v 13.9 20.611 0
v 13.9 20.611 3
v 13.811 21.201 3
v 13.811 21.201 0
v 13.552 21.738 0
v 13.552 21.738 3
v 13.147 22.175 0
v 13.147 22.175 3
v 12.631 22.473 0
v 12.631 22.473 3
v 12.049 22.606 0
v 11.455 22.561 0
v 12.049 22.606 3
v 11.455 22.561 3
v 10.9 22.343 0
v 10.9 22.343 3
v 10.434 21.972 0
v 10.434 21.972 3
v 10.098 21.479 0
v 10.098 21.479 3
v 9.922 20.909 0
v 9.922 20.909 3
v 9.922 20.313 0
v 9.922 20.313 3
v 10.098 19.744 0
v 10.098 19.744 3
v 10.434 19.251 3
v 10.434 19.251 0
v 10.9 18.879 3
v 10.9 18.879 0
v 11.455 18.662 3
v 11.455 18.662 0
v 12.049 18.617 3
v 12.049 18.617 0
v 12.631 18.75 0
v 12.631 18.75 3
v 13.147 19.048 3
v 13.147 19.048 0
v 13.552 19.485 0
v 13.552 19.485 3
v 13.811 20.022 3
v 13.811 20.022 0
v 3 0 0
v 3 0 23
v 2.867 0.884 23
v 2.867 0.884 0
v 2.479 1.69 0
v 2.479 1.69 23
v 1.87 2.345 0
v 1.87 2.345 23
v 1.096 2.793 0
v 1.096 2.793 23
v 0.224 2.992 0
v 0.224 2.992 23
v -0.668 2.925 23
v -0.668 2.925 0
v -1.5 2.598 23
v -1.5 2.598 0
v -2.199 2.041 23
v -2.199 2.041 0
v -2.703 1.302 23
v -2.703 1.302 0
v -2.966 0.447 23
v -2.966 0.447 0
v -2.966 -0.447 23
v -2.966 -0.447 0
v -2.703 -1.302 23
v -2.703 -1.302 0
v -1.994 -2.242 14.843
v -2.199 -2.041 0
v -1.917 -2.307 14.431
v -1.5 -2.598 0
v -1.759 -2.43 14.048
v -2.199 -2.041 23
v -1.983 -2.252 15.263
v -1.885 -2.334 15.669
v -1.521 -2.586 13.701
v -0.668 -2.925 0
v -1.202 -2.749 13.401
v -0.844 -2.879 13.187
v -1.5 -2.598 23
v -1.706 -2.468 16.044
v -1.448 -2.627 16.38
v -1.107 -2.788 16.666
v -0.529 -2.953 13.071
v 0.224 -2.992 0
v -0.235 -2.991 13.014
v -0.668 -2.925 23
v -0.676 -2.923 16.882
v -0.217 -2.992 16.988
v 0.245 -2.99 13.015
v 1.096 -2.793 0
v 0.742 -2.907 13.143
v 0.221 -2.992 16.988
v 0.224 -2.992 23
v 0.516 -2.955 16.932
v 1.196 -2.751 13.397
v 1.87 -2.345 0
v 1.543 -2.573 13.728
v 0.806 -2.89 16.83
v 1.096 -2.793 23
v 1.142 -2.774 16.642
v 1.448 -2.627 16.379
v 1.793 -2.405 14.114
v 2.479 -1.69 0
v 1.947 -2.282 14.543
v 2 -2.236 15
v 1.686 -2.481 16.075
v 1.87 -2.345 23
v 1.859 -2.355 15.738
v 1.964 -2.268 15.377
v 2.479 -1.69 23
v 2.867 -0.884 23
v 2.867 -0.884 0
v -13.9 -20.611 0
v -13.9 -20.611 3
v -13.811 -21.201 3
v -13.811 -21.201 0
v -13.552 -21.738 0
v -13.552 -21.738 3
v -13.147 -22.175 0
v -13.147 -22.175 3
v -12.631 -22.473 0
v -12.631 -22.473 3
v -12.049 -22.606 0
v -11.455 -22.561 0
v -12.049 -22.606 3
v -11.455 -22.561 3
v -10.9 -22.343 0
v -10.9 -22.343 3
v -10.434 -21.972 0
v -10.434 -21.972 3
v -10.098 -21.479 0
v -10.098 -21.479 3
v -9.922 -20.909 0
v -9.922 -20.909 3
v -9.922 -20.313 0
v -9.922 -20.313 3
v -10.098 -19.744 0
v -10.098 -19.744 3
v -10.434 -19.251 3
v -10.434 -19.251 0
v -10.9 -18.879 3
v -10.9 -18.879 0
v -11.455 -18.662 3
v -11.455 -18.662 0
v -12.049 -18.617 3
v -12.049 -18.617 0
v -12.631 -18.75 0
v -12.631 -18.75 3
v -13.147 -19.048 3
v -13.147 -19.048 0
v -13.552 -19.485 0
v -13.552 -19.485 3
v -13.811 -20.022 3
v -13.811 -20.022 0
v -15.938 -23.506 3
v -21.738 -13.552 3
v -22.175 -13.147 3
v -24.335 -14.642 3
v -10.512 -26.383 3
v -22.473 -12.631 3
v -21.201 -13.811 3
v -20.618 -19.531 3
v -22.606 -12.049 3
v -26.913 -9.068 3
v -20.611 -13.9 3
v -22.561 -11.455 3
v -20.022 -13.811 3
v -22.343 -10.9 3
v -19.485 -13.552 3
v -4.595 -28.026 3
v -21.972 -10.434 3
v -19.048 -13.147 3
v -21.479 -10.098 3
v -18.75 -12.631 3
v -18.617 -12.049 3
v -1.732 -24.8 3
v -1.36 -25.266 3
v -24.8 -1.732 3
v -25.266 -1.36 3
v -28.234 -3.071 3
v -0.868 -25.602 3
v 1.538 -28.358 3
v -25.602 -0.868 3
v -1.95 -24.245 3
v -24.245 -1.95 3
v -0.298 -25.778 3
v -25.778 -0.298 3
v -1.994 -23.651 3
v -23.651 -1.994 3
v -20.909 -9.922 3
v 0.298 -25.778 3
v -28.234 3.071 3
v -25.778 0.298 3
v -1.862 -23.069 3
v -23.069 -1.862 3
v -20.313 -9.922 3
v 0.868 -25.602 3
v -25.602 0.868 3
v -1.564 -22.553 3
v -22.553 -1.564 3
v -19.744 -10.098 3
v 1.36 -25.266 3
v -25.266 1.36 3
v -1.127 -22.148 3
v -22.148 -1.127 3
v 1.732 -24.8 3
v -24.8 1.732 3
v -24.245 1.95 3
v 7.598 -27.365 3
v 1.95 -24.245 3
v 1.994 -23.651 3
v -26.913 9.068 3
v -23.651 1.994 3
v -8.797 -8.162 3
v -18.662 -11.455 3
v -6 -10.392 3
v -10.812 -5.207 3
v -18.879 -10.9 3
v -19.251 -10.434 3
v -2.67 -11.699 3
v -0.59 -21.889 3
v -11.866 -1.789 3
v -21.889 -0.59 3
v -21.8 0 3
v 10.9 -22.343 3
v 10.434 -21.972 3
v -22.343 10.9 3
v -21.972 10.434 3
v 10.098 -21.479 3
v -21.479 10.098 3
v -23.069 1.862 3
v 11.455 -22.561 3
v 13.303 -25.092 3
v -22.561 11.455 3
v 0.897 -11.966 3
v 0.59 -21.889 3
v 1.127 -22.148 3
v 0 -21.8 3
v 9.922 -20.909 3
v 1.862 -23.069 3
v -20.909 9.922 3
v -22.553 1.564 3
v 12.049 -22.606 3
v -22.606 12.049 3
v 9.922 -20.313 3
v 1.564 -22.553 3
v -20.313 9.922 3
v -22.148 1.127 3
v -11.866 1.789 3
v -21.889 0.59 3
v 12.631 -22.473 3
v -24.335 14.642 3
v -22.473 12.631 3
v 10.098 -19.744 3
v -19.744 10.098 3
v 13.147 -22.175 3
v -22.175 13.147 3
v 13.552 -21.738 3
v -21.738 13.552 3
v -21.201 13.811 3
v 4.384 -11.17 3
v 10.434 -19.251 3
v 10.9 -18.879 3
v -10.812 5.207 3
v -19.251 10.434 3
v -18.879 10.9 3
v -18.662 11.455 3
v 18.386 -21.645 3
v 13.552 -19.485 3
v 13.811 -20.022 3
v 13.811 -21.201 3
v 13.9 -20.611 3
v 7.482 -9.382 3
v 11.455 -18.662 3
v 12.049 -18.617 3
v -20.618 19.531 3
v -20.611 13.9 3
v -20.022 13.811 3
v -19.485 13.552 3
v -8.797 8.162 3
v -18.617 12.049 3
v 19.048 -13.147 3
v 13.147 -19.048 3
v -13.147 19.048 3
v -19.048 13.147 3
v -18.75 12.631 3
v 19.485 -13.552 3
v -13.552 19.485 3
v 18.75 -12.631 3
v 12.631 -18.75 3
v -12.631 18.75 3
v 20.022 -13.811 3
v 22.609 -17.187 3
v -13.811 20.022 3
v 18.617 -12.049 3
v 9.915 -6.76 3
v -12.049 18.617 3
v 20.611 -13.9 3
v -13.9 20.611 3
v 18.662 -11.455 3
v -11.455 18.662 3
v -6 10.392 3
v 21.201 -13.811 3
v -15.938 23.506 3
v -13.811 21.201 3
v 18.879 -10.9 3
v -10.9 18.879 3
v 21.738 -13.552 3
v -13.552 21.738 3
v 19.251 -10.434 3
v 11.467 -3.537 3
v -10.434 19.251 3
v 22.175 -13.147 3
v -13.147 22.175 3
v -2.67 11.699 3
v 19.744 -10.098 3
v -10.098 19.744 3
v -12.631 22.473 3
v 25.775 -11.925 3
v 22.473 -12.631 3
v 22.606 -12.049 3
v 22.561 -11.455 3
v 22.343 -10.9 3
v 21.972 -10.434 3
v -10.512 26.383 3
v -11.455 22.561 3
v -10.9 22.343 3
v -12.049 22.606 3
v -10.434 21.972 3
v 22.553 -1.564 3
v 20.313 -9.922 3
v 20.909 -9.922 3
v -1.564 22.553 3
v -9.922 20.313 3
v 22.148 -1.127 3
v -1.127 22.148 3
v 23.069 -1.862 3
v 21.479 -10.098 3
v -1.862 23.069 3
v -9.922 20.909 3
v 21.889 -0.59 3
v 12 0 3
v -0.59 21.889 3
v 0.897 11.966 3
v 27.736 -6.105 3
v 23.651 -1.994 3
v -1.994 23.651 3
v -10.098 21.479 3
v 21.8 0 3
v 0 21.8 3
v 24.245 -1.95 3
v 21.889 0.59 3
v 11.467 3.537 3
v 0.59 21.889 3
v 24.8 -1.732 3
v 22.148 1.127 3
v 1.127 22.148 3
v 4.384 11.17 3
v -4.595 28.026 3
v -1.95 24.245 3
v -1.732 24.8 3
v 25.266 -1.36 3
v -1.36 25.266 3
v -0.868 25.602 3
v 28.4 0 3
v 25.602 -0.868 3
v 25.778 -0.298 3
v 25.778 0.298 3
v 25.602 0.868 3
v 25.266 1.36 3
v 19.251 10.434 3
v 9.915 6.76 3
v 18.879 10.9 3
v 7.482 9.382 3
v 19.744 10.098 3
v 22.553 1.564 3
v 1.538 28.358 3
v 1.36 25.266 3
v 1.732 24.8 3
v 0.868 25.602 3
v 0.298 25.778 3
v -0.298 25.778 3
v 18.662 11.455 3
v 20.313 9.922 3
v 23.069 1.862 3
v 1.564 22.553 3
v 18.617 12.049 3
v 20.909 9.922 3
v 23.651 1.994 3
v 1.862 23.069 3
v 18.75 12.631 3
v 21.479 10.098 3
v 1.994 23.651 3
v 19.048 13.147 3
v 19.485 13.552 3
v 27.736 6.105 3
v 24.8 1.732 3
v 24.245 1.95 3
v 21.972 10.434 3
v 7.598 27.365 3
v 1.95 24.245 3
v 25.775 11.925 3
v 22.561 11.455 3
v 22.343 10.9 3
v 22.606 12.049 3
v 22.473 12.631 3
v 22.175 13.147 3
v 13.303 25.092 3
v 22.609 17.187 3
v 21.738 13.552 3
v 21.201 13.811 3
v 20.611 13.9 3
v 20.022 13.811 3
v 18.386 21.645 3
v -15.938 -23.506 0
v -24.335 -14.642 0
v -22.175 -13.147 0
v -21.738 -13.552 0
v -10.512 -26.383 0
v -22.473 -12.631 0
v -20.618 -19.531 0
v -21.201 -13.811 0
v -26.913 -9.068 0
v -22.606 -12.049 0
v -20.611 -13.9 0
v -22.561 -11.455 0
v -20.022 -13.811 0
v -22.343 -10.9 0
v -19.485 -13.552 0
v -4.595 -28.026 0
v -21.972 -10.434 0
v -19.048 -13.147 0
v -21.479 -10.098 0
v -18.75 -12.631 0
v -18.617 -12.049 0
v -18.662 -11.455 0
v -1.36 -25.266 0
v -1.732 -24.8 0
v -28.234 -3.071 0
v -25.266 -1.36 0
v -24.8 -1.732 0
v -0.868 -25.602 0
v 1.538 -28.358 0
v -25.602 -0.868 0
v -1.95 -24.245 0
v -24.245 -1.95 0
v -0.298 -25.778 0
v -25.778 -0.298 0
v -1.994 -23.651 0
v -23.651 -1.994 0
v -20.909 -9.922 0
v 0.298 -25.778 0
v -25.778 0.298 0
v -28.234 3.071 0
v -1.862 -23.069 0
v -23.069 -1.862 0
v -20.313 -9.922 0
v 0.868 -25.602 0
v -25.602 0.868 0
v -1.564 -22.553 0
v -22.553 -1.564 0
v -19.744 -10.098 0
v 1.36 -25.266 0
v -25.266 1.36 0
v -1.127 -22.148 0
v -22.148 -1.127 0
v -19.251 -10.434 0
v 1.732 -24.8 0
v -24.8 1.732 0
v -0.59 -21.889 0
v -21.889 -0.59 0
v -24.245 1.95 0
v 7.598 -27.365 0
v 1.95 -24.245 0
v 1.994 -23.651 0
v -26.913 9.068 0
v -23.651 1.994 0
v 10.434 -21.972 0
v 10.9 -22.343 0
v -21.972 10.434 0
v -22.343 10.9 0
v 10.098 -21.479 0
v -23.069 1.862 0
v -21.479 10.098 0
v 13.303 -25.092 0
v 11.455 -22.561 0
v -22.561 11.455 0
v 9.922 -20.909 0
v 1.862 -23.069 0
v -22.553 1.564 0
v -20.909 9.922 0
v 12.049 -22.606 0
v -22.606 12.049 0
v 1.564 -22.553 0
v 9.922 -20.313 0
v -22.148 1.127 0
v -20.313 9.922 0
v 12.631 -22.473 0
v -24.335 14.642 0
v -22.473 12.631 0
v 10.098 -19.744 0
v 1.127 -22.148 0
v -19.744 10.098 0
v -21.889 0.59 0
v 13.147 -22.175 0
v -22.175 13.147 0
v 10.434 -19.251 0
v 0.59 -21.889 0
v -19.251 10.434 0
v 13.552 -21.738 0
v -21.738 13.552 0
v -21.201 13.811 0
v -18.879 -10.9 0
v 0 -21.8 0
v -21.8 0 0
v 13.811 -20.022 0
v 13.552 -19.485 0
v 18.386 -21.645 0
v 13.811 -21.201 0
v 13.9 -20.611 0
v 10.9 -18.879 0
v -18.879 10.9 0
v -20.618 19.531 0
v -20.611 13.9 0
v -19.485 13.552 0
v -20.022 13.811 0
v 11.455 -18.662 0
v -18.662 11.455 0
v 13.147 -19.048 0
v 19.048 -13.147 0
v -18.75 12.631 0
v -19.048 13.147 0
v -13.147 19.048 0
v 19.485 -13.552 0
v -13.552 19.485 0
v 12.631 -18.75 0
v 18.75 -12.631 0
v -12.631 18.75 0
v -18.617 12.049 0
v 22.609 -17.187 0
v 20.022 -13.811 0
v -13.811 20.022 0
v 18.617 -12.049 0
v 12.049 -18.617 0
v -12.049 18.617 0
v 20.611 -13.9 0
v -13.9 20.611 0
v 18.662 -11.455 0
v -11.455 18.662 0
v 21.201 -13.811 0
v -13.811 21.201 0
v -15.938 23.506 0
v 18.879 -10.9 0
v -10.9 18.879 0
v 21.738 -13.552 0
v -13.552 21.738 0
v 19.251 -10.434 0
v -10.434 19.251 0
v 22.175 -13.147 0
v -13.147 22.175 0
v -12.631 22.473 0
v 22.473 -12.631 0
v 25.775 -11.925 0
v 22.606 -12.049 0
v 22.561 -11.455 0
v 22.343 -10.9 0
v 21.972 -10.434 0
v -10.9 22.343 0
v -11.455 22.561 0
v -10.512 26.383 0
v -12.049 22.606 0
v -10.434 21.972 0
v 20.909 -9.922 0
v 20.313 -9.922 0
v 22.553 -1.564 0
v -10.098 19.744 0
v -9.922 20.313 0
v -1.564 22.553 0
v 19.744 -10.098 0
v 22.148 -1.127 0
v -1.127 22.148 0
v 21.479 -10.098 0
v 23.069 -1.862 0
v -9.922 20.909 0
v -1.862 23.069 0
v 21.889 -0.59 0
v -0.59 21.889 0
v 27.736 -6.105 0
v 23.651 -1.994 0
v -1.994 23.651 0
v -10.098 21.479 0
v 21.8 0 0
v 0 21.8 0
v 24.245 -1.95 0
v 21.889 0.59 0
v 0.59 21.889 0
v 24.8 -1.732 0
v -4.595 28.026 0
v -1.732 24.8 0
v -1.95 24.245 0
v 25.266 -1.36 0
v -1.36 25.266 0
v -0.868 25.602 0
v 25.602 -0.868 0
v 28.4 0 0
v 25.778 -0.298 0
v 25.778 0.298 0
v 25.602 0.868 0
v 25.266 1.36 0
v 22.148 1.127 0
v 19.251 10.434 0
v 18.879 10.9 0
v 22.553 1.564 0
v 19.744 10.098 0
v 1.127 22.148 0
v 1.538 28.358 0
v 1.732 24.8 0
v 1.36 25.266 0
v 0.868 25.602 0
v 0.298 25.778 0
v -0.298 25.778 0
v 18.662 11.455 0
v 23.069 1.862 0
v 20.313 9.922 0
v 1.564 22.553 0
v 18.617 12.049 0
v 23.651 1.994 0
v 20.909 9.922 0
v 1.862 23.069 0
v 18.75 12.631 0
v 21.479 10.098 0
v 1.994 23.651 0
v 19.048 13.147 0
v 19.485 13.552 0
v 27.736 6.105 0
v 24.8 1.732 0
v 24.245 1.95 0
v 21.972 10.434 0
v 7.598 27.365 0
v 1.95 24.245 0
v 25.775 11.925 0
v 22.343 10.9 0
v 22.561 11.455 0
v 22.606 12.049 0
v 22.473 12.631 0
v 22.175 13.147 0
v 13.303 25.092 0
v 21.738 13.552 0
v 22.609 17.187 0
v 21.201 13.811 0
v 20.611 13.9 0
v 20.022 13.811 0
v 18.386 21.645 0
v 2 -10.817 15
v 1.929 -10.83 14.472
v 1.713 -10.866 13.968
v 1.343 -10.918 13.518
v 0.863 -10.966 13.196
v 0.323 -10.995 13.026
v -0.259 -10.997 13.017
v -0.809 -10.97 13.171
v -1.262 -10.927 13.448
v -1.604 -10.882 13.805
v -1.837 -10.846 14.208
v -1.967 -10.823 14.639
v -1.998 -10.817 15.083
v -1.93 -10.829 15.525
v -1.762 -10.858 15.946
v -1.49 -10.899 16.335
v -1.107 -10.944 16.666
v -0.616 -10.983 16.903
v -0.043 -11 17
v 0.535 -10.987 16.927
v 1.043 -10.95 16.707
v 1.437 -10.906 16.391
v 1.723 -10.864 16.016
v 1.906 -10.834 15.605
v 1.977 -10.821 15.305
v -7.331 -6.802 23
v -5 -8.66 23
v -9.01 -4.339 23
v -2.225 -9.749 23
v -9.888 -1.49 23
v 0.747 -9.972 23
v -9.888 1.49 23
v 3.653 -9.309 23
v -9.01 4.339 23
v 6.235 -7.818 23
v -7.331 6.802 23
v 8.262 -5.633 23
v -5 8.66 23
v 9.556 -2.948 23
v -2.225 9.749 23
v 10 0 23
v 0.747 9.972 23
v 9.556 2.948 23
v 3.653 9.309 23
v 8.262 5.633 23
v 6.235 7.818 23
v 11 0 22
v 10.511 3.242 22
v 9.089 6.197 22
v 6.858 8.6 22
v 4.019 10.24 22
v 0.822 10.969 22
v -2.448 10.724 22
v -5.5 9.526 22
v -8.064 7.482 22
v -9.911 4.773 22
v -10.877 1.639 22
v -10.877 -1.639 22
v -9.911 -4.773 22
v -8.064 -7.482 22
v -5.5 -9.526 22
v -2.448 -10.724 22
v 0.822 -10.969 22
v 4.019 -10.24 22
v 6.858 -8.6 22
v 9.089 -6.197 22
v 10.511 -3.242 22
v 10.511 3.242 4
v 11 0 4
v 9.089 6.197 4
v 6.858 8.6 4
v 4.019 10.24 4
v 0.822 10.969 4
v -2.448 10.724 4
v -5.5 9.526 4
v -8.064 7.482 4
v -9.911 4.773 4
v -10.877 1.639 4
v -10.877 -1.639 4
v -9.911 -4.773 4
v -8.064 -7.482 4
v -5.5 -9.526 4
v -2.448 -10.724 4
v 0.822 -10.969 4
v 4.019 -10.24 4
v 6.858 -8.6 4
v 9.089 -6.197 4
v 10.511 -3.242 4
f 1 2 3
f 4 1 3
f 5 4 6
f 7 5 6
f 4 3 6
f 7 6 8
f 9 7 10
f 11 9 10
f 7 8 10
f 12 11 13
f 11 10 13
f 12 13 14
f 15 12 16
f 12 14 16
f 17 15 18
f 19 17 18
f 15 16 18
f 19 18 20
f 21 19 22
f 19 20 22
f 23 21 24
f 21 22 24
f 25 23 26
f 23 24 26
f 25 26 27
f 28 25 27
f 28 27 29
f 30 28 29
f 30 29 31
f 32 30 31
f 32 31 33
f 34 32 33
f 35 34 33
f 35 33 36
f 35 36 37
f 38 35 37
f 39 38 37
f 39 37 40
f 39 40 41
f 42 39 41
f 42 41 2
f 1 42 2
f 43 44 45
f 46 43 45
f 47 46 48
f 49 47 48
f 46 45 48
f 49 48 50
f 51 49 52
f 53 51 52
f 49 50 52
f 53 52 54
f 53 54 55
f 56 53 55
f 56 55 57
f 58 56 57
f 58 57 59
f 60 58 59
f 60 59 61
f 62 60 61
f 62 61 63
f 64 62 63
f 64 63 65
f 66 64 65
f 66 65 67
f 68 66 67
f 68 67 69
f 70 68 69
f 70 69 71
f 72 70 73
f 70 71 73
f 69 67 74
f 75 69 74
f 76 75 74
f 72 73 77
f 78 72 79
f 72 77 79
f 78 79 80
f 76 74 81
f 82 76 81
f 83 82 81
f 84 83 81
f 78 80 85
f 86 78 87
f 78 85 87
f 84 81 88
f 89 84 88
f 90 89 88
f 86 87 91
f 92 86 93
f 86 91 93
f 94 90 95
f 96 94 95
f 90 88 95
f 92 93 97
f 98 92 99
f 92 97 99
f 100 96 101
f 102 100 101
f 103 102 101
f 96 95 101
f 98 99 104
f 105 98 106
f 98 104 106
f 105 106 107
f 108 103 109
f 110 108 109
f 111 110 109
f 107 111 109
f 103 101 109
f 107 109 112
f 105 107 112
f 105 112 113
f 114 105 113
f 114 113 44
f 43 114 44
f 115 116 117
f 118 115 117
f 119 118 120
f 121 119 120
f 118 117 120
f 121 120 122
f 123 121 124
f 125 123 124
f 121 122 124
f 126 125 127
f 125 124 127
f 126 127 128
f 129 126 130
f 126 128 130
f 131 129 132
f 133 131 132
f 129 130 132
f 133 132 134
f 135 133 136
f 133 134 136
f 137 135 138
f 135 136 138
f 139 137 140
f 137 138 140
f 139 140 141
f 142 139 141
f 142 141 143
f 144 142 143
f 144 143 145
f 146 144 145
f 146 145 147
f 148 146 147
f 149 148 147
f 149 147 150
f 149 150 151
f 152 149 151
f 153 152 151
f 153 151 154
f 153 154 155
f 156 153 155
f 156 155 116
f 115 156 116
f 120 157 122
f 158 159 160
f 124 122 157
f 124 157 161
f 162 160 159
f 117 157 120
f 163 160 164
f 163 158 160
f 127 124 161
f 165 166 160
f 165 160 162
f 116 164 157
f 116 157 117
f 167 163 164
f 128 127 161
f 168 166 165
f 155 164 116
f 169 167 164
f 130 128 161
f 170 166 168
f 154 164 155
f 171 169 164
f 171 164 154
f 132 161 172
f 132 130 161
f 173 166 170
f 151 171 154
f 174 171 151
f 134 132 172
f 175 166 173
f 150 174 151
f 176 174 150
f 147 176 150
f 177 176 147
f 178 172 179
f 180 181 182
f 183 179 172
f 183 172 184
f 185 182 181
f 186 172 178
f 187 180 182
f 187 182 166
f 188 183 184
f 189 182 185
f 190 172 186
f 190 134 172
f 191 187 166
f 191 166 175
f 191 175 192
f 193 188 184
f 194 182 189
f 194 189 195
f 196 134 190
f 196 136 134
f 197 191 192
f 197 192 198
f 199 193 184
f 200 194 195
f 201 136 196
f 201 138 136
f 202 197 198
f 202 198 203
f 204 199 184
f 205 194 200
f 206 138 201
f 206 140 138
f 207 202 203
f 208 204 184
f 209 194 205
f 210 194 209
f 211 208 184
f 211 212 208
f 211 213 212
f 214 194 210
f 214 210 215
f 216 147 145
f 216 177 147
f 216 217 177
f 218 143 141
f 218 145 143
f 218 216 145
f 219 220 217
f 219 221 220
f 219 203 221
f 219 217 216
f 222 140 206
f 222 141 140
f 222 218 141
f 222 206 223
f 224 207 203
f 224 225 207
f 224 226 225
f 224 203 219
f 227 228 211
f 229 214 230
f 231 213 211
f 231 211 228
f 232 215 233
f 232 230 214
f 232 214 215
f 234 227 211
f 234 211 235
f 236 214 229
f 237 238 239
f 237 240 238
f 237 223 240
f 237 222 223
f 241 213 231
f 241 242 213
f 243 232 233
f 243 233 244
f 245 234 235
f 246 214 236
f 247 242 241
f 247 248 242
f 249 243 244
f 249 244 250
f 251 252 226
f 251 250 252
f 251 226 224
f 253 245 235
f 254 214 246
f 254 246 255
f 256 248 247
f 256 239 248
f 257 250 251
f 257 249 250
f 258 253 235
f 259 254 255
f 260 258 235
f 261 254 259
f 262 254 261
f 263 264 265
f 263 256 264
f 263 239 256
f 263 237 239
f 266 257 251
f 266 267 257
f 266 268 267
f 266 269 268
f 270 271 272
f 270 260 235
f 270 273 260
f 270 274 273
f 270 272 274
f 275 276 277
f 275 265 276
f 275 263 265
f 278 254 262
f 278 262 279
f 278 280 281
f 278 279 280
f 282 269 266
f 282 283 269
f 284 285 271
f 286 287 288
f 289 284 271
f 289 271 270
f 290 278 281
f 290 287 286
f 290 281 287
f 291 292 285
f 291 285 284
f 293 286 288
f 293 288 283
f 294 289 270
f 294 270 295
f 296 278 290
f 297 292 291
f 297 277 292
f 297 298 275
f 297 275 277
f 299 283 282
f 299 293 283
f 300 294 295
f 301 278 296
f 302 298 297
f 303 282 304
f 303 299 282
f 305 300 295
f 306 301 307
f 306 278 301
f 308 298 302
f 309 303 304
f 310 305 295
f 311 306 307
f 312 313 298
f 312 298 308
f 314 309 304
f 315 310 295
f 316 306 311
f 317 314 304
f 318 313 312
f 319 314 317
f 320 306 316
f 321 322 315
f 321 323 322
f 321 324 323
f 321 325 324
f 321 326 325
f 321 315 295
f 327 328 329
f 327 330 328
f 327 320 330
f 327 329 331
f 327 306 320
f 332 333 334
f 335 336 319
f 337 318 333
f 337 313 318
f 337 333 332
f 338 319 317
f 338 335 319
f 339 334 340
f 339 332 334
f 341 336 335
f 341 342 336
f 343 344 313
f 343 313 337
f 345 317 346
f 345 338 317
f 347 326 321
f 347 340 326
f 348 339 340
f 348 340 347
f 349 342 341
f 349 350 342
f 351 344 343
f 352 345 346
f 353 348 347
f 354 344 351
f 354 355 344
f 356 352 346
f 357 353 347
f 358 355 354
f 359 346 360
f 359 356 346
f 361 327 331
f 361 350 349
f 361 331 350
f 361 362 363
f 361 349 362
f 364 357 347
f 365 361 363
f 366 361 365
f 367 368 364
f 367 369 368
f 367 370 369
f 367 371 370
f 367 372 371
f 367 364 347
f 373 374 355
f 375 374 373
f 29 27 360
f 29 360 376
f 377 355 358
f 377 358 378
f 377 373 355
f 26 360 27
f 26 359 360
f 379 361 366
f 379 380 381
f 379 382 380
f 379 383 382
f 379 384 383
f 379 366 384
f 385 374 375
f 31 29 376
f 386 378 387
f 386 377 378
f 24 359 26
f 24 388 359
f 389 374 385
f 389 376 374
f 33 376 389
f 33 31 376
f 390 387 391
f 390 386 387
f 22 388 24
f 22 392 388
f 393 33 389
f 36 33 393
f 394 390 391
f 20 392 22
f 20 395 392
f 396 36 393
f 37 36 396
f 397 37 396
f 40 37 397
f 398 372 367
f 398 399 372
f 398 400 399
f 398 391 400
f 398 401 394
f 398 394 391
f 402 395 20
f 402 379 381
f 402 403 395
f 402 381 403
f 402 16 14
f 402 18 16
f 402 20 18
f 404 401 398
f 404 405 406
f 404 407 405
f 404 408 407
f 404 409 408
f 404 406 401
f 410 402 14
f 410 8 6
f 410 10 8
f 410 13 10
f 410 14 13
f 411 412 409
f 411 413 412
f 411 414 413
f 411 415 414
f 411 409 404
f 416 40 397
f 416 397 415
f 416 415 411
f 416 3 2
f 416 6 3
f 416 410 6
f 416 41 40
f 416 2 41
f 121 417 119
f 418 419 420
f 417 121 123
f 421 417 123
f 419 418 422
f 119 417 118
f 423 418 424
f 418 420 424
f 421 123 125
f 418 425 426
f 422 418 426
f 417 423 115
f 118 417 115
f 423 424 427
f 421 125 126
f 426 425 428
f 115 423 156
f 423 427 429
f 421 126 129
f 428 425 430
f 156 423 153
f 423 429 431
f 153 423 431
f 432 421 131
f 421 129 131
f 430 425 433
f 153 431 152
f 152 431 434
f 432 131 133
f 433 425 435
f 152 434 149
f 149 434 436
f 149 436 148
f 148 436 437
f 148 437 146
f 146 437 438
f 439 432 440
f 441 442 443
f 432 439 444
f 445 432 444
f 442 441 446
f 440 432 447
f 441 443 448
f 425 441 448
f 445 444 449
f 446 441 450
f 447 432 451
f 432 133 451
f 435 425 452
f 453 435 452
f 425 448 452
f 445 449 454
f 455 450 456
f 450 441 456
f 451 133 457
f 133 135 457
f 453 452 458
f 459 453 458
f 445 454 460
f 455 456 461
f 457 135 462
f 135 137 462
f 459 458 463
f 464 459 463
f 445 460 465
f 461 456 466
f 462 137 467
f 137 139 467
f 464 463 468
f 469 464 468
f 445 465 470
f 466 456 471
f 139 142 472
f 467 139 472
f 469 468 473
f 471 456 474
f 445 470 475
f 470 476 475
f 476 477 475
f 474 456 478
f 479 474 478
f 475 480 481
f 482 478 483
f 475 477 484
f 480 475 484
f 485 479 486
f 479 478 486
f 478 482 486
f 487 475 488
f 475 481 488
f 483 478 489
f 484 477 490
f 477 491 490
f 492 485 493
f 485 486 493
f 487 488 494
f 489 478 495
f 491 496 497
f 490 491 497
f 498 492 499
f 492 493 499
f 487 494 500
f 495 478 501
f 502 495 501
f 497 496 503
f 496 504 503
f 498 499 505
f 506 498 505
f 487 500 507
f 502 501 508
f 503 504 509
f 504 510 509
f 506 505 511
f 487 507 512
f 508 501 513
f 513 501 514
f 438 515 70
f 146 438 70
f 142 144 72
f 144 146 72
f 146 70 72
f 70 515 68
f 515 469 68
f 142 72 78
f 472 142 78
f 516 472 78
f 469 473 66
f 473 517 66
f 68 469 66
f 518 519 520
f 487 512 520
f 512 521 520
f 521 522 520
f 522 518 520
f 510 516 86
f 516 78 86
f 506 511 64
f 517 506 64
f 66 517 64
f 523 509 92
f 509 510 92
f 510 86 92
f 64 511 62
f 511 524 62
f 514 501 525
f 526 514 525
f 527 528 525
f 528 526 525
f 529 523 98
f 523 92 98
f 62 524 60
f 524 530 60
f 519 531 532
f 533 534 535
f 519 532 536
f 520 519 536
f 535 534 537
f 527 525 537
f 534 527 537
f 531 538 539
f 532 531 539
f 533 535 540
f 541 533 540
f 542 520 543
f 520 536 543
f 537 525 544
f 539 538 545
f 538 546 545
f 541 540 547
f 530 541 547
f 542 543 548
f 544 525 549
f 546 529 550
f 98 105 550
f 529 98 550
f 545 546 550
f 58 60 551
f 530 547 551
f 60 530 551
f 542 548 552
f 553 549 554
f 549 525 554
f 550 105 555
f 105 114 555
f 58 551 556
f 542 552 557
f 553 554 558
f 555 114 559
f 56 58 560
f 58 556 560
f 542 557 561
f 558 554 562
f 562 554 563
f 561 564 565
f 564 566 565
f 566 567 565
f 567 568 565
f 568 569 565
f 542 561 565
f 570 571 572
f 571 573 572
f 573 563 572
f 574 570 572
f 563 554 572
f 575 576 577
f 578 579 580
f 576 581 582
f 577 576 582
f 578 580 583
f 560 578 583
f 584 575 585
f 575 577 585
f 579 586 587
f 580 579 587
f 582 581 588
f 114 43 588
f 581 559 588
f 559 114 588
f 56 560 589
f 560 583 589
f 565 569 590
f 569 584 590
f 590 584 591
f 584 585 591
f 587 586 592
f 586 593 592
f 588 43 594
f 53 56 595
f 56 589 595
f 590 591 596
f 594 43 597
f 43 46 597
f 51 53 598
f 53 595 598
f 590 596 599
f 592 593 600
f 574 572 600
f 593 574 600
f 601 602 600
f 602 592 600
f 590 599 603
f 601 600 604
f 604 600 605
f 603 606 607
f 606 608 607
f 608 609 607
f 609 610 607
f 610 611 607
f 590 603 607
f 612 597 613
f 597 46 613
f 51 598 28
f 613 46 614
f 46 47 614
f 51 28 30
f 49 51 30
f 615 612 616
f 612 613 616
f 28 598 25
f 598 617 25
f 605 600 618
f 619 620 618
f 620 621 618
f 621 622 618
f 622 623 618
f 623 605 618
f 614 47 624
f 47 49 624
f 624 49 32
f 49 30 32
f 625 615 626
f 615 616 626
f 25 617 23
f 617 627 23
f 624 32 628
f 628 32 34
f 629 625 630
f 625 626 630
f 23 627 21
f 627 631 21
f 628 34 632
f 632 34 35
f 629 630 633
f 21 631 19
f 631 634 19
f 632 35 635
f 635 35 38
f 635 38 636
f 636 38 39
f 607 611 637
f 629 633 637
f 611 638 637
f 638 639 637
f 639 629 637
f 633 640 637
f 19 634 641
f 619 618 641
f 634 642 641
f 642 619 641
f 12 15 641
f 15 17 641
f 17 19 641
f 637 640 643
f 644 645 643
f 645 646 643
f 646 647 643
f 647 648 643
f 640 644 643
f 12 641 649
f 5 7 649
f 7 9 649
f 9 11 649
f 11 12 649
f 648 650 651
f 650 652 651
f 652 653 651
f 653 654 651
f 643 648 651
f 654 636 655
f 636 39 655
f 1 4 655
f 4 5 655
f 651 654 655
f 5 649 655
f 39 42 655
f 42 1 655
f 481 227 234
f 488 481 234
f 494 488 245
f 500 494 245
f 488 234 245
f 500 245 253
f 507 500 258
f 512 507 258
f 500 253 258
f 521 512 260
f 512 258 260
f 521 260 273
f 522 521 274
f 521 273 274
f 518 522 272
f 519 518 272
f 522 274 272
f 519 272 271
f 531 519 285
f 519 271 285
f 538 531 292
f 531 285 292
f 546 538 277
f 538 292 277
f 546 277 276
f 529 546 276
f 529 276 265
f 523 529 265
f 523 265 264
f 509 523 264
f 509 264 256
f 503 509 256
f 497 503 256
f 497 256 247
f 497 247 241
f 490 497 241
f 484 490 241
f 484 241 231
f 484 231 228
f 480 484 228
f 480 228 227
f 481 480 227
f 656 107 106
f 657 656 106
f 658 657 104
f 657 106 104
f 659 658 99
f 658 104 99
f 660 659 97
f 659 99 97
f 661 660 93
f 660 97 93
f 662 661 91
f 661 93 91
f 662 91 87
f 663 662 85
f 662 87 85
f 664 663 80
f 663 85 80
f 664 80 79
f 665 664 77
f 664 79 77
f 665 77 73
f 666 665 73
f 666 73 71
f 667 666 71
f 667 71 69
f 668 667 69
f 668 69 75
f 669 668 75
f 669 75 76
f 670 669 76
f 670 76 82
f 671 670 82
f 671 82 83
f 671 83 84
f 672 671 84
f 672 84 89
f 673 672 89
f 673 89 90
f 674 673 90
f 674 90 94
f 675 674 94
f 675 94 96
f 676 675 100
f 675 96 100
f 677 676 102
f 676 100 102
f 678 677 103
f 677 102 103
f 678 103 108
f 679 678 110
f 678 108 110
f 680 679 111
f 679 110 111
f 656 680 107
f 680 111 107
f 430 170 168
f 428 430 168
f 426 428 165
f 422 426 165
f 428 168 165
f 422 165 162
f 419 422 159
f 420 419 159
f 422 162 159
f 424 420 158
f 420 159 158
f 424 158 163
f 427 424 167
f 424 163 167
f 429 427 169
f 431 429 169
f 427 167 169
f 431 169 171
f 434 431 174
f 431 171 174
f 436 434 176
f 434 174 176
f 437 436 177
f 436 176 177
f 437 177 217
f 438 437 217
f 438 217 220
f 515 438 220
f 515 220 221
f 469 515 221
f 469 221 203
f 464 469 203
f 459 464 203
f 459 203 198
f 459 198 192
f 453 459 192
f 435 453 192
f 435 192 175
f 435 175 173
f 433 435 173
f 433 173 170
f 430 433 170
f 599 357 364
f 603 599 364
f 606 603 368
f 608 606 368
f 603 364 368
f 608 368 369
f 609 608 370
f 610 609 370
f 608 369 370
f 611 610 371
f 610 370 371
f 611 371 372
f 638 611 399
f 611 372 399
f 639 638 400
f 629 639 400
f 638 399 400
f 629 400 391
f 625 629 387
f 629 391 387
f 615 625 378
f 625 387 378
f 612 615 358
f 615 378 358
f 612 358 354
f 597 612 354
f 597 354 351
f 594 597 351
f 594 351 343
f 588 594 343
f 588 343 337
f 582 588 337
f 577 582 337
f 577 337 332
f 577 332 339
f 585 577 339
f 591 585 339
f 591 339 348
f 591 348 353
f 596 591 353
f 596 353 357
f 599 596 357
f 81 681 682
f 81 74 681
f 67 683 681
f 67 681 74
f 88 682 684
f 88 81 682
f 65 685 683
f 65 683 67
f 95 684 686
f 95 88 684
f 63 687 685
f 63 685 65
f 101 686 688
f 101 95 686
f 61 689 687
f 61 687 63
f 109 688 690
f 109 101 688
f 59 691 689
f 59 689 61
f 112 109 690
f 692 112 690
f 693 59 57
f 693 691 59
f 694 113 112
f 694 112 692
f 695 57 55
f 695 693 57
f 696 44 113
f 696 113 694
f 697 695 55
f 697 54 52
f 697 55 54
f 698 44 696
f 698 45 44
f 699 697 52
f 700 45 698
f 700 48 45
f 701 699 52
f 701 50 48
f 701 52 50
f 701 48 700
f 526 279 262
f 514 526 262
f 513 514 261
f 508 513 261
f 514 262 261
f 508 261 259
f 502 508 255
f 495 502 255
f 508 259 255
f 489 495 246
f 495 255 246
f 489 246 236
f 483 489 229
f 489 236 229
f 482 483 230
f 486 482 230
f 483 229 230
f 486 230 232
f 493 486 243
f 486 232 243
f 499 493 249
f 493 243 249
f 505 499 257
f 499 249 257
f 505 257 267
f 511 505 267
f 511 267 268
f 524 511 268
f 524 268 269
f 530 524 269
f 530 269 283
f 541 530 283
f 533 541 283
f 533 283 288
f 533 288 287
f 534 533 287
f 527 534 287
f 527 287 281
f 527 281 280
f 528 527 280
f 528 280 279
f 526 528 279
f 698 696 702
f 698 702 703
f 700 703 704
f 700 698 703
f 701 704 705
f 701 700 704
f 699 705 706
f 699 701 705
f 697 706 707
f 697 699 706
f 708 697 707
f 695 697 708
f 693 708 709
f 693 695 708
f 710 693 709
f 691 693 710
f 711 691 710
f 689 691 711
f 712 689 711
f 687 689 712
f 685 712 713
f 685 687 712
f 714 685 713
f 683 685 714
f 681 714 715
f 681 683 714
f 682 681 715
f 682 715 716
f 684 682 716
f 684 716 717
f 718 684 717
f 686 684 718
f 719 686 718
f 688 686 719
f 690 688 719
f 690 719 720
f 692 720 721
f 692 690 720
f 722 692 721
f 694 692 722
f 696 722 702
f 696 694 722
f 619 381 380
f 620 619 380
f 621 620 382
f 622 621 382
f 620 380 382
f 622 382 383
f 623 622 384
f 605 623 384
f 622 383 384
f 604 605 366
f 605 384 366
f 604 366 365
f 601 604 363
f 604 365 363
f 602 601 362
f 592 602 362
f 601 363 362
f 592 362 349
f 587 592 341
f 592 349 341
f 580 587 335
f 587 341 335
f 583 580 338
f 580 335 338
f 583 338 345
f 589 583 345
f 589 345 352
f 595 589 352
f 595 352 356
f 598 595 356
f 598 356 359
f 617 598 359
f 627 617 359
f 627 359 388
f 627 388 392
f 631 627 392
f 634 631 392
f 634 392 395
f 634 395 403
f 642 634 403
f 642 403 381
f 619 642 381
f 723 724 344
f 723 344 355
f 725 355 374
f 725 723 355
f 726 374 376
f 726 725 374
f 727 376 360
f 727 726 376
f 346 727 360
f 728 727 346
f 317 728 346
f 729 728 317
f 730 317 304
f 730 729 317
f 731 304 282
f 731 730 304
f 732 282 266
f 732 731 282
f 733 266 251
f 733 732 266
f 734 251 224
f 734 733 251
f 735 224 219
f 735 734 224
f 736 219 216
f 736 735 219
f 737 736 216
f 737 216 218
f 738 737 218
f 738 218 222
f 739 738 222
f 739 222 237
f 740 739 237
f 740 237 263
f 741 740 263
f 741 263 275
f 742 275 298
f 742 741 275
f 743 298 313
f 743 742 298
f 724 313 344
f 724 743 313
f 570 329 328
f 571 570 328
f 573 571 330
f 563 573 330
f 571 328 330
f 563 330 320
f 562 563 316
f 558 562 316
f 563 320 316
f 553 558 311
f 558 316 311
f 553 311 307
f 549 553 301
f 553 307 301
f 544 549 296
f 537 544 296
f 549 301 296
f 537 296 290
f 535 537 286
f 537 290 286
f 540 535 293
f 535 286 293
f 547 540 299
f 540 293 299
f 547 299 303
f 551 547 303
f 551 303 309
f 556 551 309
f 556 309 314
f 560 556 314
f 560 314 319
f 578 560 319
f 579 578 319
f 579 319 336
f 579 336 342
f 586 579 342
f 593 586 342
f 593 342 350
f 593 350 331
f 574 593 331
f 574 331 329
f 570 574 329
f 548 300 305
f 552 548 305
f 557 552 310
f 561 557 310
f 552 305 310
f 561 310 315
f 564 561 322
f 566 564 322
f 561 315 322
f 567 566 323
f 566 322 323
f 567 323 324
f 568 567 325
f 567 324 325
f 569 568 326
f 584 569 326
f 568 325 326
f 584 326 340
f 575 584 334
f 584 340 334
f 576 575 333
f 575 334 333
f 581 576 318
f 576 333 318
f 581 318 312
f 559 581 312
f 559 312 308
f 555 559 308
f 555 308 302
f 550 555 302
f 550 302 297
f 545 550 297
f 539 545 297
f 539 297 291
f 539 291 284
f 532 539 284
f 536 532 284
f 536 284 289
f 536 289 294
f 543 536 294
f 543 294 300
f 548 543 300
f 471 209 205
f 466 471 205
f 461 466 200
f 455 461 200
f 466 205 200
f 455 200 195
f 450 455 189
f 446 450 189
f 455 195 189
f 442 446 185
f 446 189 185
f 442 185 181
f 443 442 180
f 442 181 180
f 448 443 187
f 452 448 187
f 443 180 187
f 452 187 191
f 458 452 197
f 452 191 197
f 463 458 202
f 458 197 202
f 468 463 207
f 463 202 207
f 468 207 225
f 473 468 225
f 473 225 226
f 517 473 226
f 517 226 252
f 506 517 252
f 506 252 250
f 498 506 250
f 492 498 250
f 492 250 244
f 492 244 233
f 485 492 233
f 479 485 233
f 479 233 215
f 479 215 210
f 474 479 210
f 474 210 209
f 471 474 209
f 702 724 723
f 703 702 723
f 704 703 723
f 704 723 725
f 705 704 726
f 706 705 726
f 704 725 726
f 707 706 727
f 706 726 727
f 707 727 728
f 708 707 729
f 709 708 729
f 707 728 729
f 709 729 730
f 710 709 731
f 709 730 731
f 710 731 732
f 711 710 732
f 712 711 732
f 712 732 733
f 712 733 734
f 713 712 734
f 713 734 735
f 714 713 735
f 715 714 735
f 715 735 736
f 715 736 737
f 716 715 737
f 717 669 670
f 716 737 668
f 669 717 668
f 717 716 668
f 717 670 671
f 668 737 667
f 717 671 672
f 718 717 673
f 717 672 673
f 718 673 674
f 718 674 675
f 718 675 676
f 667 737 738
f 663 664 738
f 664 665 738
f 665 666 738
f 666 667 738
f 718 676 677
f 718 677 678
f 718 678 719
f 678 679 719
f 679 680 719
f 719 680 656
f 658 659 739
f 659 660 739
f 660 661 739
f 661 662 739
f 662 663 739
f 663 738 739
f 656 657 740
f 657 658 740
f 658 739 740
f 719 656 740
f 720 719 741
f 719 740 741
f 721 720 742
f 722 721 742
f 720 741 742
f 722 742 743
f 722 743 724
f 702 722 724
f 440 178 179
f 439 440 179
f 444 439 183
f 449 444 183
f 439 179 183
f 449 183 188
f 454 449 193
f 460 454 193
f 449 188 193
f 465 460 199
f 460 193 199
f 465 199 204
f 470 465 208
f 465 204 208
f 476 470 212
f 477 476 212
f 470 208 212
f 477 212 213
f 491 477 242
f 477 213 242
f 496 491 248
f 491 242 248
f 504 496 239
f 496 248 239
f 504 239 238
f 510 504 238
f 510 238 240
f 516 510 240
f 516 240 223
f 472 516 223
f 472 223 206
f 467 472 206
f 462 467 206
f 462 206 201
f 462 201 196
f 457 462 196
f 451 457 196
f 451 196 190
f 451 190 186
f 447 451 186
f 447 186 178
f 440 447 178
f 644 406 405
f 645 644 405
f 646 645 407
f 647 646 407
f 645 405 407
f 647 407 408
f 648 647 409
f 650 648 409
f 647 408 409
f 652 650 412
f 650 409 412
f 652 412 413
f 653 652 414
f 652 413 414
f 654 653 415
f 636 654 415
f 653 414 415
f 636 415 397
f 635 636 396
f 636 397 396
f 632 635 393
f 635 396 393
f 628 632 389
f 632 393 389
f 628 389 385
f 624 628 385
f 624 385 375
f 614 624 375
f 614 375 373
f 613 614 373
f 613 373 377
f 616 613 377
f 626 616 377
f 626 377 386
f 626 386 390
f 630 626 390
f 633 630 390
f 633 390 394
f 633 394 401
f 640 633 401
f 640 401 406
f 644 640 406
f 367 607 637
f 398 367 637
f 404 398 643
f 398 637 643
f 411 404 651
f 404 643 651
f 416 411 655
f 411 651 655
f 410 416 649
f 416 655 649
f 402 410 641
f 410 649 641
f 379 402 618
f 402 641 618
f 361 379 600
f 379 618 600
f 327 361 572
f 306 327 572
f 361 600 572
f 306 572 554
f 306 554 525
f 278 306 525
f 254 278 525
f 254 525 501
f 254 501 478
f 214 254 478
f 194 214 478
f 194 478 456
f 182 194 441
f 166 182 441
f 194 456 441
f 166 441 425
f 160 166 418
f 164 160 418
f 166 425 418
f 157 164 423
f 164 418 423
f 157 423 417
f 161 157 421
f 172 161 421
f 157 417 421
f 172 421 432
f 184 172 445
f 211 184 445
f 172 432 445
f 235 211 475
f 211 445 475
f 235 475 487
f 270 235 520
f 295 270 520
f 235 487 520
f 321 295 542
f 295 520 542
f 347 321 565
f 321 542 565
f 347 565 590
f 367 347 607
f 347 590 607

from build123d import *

# Parameters (mm, degrees)
SKETCH1_R           = 28.4
BOSS_EXTRUDE1_DEPTH = 3
SKETCH2_R           = 11
BOSS_EXTRUDE2_DEPTH = 20
SKETCH3_R           = 3
CUT_EXTRUDE1_DEPTH  = 24
SKETCH4_R           = 2
CUT_EXTRUDE2_DEPTH  = 15
CHAMFER1_SIZE       = 1
SKETCH5_R           = 2
CUT_EXTRUDE5_DEPTH  = 4.0000001
CIRPATTERN2_COUNT   = 12


with BuildPart() as part:
    # Sketch1 → Boss-Extrude1 (new body)
    with BuildSketch(Plane.XY):
        Circle(SKETCH1_R)
    extrude(amount=BOSS_EXTRUDE1_DEPTH)

    # Sketch2 → Boss-Extrude2 (add)
    with BuildSketch(Plane.XY.offset(3)):
        Circle(SKETCH2_R)
    extrude(amount=BOSS_EXTRUDE2_DEPTH)

    # Sketch3 → Cut-Extrude1 (cut, through all)
    with BuildSketch(Plane.XY.offset(23)):
        Circle(SKETCH3_R)
    extrude(amount=-CUT_EXTRUDE1_DEPTH, mode=Mode.SUBTRACT)

    # Sketch4 → Cut-Extrude2 (cut)
    with BuildSketch(Plane(origin=(0, 0, 0), x_dir=(1, 0, 0), z_dir=(0, 1, 0))):
        with Locations((0, -15)):
            Circle(SKETCH4_R)
    extrude(amount=-CUT_EXTRUDE2_DEPTH, mode=Mode.SUBTRACT)

    # Chamfer1
    chamfer1_edges = [part.edges().sort_by_distance(p)[0] for p in [
        (-11, 0, 3),
        (-11, 0, 23),
    ]]
    chamfer(chamfer1_edges, length=CHAMFER1_SIZE)

    # Sketch5 → Cut-Extrude5 (cut, through all)
    with BuildSketch(Plane.XY.offset(3)):
        with Locations((11.9, 20.61140461)):
            Circle(SKETCH5_R)
    cut_extrude5 = extrude(amount=-CUT_EXTRUDE5_DEPTH, mode=Mode.SUBTRACT)

    # CirPattern2: Cut-Extrude5 ×12 about axis
    cirpattern2_axis = Axis((0, 0, 0), (0, 0, 1))
    for i in range(1, CIRPATTERN2_COUNT):
        add(cut_extrude5.rotate(cirpattern2_axis, i * 360 / CIRPATTERN2_COUNT), mode=Mode.SUBTRACT)


solid = part.part
